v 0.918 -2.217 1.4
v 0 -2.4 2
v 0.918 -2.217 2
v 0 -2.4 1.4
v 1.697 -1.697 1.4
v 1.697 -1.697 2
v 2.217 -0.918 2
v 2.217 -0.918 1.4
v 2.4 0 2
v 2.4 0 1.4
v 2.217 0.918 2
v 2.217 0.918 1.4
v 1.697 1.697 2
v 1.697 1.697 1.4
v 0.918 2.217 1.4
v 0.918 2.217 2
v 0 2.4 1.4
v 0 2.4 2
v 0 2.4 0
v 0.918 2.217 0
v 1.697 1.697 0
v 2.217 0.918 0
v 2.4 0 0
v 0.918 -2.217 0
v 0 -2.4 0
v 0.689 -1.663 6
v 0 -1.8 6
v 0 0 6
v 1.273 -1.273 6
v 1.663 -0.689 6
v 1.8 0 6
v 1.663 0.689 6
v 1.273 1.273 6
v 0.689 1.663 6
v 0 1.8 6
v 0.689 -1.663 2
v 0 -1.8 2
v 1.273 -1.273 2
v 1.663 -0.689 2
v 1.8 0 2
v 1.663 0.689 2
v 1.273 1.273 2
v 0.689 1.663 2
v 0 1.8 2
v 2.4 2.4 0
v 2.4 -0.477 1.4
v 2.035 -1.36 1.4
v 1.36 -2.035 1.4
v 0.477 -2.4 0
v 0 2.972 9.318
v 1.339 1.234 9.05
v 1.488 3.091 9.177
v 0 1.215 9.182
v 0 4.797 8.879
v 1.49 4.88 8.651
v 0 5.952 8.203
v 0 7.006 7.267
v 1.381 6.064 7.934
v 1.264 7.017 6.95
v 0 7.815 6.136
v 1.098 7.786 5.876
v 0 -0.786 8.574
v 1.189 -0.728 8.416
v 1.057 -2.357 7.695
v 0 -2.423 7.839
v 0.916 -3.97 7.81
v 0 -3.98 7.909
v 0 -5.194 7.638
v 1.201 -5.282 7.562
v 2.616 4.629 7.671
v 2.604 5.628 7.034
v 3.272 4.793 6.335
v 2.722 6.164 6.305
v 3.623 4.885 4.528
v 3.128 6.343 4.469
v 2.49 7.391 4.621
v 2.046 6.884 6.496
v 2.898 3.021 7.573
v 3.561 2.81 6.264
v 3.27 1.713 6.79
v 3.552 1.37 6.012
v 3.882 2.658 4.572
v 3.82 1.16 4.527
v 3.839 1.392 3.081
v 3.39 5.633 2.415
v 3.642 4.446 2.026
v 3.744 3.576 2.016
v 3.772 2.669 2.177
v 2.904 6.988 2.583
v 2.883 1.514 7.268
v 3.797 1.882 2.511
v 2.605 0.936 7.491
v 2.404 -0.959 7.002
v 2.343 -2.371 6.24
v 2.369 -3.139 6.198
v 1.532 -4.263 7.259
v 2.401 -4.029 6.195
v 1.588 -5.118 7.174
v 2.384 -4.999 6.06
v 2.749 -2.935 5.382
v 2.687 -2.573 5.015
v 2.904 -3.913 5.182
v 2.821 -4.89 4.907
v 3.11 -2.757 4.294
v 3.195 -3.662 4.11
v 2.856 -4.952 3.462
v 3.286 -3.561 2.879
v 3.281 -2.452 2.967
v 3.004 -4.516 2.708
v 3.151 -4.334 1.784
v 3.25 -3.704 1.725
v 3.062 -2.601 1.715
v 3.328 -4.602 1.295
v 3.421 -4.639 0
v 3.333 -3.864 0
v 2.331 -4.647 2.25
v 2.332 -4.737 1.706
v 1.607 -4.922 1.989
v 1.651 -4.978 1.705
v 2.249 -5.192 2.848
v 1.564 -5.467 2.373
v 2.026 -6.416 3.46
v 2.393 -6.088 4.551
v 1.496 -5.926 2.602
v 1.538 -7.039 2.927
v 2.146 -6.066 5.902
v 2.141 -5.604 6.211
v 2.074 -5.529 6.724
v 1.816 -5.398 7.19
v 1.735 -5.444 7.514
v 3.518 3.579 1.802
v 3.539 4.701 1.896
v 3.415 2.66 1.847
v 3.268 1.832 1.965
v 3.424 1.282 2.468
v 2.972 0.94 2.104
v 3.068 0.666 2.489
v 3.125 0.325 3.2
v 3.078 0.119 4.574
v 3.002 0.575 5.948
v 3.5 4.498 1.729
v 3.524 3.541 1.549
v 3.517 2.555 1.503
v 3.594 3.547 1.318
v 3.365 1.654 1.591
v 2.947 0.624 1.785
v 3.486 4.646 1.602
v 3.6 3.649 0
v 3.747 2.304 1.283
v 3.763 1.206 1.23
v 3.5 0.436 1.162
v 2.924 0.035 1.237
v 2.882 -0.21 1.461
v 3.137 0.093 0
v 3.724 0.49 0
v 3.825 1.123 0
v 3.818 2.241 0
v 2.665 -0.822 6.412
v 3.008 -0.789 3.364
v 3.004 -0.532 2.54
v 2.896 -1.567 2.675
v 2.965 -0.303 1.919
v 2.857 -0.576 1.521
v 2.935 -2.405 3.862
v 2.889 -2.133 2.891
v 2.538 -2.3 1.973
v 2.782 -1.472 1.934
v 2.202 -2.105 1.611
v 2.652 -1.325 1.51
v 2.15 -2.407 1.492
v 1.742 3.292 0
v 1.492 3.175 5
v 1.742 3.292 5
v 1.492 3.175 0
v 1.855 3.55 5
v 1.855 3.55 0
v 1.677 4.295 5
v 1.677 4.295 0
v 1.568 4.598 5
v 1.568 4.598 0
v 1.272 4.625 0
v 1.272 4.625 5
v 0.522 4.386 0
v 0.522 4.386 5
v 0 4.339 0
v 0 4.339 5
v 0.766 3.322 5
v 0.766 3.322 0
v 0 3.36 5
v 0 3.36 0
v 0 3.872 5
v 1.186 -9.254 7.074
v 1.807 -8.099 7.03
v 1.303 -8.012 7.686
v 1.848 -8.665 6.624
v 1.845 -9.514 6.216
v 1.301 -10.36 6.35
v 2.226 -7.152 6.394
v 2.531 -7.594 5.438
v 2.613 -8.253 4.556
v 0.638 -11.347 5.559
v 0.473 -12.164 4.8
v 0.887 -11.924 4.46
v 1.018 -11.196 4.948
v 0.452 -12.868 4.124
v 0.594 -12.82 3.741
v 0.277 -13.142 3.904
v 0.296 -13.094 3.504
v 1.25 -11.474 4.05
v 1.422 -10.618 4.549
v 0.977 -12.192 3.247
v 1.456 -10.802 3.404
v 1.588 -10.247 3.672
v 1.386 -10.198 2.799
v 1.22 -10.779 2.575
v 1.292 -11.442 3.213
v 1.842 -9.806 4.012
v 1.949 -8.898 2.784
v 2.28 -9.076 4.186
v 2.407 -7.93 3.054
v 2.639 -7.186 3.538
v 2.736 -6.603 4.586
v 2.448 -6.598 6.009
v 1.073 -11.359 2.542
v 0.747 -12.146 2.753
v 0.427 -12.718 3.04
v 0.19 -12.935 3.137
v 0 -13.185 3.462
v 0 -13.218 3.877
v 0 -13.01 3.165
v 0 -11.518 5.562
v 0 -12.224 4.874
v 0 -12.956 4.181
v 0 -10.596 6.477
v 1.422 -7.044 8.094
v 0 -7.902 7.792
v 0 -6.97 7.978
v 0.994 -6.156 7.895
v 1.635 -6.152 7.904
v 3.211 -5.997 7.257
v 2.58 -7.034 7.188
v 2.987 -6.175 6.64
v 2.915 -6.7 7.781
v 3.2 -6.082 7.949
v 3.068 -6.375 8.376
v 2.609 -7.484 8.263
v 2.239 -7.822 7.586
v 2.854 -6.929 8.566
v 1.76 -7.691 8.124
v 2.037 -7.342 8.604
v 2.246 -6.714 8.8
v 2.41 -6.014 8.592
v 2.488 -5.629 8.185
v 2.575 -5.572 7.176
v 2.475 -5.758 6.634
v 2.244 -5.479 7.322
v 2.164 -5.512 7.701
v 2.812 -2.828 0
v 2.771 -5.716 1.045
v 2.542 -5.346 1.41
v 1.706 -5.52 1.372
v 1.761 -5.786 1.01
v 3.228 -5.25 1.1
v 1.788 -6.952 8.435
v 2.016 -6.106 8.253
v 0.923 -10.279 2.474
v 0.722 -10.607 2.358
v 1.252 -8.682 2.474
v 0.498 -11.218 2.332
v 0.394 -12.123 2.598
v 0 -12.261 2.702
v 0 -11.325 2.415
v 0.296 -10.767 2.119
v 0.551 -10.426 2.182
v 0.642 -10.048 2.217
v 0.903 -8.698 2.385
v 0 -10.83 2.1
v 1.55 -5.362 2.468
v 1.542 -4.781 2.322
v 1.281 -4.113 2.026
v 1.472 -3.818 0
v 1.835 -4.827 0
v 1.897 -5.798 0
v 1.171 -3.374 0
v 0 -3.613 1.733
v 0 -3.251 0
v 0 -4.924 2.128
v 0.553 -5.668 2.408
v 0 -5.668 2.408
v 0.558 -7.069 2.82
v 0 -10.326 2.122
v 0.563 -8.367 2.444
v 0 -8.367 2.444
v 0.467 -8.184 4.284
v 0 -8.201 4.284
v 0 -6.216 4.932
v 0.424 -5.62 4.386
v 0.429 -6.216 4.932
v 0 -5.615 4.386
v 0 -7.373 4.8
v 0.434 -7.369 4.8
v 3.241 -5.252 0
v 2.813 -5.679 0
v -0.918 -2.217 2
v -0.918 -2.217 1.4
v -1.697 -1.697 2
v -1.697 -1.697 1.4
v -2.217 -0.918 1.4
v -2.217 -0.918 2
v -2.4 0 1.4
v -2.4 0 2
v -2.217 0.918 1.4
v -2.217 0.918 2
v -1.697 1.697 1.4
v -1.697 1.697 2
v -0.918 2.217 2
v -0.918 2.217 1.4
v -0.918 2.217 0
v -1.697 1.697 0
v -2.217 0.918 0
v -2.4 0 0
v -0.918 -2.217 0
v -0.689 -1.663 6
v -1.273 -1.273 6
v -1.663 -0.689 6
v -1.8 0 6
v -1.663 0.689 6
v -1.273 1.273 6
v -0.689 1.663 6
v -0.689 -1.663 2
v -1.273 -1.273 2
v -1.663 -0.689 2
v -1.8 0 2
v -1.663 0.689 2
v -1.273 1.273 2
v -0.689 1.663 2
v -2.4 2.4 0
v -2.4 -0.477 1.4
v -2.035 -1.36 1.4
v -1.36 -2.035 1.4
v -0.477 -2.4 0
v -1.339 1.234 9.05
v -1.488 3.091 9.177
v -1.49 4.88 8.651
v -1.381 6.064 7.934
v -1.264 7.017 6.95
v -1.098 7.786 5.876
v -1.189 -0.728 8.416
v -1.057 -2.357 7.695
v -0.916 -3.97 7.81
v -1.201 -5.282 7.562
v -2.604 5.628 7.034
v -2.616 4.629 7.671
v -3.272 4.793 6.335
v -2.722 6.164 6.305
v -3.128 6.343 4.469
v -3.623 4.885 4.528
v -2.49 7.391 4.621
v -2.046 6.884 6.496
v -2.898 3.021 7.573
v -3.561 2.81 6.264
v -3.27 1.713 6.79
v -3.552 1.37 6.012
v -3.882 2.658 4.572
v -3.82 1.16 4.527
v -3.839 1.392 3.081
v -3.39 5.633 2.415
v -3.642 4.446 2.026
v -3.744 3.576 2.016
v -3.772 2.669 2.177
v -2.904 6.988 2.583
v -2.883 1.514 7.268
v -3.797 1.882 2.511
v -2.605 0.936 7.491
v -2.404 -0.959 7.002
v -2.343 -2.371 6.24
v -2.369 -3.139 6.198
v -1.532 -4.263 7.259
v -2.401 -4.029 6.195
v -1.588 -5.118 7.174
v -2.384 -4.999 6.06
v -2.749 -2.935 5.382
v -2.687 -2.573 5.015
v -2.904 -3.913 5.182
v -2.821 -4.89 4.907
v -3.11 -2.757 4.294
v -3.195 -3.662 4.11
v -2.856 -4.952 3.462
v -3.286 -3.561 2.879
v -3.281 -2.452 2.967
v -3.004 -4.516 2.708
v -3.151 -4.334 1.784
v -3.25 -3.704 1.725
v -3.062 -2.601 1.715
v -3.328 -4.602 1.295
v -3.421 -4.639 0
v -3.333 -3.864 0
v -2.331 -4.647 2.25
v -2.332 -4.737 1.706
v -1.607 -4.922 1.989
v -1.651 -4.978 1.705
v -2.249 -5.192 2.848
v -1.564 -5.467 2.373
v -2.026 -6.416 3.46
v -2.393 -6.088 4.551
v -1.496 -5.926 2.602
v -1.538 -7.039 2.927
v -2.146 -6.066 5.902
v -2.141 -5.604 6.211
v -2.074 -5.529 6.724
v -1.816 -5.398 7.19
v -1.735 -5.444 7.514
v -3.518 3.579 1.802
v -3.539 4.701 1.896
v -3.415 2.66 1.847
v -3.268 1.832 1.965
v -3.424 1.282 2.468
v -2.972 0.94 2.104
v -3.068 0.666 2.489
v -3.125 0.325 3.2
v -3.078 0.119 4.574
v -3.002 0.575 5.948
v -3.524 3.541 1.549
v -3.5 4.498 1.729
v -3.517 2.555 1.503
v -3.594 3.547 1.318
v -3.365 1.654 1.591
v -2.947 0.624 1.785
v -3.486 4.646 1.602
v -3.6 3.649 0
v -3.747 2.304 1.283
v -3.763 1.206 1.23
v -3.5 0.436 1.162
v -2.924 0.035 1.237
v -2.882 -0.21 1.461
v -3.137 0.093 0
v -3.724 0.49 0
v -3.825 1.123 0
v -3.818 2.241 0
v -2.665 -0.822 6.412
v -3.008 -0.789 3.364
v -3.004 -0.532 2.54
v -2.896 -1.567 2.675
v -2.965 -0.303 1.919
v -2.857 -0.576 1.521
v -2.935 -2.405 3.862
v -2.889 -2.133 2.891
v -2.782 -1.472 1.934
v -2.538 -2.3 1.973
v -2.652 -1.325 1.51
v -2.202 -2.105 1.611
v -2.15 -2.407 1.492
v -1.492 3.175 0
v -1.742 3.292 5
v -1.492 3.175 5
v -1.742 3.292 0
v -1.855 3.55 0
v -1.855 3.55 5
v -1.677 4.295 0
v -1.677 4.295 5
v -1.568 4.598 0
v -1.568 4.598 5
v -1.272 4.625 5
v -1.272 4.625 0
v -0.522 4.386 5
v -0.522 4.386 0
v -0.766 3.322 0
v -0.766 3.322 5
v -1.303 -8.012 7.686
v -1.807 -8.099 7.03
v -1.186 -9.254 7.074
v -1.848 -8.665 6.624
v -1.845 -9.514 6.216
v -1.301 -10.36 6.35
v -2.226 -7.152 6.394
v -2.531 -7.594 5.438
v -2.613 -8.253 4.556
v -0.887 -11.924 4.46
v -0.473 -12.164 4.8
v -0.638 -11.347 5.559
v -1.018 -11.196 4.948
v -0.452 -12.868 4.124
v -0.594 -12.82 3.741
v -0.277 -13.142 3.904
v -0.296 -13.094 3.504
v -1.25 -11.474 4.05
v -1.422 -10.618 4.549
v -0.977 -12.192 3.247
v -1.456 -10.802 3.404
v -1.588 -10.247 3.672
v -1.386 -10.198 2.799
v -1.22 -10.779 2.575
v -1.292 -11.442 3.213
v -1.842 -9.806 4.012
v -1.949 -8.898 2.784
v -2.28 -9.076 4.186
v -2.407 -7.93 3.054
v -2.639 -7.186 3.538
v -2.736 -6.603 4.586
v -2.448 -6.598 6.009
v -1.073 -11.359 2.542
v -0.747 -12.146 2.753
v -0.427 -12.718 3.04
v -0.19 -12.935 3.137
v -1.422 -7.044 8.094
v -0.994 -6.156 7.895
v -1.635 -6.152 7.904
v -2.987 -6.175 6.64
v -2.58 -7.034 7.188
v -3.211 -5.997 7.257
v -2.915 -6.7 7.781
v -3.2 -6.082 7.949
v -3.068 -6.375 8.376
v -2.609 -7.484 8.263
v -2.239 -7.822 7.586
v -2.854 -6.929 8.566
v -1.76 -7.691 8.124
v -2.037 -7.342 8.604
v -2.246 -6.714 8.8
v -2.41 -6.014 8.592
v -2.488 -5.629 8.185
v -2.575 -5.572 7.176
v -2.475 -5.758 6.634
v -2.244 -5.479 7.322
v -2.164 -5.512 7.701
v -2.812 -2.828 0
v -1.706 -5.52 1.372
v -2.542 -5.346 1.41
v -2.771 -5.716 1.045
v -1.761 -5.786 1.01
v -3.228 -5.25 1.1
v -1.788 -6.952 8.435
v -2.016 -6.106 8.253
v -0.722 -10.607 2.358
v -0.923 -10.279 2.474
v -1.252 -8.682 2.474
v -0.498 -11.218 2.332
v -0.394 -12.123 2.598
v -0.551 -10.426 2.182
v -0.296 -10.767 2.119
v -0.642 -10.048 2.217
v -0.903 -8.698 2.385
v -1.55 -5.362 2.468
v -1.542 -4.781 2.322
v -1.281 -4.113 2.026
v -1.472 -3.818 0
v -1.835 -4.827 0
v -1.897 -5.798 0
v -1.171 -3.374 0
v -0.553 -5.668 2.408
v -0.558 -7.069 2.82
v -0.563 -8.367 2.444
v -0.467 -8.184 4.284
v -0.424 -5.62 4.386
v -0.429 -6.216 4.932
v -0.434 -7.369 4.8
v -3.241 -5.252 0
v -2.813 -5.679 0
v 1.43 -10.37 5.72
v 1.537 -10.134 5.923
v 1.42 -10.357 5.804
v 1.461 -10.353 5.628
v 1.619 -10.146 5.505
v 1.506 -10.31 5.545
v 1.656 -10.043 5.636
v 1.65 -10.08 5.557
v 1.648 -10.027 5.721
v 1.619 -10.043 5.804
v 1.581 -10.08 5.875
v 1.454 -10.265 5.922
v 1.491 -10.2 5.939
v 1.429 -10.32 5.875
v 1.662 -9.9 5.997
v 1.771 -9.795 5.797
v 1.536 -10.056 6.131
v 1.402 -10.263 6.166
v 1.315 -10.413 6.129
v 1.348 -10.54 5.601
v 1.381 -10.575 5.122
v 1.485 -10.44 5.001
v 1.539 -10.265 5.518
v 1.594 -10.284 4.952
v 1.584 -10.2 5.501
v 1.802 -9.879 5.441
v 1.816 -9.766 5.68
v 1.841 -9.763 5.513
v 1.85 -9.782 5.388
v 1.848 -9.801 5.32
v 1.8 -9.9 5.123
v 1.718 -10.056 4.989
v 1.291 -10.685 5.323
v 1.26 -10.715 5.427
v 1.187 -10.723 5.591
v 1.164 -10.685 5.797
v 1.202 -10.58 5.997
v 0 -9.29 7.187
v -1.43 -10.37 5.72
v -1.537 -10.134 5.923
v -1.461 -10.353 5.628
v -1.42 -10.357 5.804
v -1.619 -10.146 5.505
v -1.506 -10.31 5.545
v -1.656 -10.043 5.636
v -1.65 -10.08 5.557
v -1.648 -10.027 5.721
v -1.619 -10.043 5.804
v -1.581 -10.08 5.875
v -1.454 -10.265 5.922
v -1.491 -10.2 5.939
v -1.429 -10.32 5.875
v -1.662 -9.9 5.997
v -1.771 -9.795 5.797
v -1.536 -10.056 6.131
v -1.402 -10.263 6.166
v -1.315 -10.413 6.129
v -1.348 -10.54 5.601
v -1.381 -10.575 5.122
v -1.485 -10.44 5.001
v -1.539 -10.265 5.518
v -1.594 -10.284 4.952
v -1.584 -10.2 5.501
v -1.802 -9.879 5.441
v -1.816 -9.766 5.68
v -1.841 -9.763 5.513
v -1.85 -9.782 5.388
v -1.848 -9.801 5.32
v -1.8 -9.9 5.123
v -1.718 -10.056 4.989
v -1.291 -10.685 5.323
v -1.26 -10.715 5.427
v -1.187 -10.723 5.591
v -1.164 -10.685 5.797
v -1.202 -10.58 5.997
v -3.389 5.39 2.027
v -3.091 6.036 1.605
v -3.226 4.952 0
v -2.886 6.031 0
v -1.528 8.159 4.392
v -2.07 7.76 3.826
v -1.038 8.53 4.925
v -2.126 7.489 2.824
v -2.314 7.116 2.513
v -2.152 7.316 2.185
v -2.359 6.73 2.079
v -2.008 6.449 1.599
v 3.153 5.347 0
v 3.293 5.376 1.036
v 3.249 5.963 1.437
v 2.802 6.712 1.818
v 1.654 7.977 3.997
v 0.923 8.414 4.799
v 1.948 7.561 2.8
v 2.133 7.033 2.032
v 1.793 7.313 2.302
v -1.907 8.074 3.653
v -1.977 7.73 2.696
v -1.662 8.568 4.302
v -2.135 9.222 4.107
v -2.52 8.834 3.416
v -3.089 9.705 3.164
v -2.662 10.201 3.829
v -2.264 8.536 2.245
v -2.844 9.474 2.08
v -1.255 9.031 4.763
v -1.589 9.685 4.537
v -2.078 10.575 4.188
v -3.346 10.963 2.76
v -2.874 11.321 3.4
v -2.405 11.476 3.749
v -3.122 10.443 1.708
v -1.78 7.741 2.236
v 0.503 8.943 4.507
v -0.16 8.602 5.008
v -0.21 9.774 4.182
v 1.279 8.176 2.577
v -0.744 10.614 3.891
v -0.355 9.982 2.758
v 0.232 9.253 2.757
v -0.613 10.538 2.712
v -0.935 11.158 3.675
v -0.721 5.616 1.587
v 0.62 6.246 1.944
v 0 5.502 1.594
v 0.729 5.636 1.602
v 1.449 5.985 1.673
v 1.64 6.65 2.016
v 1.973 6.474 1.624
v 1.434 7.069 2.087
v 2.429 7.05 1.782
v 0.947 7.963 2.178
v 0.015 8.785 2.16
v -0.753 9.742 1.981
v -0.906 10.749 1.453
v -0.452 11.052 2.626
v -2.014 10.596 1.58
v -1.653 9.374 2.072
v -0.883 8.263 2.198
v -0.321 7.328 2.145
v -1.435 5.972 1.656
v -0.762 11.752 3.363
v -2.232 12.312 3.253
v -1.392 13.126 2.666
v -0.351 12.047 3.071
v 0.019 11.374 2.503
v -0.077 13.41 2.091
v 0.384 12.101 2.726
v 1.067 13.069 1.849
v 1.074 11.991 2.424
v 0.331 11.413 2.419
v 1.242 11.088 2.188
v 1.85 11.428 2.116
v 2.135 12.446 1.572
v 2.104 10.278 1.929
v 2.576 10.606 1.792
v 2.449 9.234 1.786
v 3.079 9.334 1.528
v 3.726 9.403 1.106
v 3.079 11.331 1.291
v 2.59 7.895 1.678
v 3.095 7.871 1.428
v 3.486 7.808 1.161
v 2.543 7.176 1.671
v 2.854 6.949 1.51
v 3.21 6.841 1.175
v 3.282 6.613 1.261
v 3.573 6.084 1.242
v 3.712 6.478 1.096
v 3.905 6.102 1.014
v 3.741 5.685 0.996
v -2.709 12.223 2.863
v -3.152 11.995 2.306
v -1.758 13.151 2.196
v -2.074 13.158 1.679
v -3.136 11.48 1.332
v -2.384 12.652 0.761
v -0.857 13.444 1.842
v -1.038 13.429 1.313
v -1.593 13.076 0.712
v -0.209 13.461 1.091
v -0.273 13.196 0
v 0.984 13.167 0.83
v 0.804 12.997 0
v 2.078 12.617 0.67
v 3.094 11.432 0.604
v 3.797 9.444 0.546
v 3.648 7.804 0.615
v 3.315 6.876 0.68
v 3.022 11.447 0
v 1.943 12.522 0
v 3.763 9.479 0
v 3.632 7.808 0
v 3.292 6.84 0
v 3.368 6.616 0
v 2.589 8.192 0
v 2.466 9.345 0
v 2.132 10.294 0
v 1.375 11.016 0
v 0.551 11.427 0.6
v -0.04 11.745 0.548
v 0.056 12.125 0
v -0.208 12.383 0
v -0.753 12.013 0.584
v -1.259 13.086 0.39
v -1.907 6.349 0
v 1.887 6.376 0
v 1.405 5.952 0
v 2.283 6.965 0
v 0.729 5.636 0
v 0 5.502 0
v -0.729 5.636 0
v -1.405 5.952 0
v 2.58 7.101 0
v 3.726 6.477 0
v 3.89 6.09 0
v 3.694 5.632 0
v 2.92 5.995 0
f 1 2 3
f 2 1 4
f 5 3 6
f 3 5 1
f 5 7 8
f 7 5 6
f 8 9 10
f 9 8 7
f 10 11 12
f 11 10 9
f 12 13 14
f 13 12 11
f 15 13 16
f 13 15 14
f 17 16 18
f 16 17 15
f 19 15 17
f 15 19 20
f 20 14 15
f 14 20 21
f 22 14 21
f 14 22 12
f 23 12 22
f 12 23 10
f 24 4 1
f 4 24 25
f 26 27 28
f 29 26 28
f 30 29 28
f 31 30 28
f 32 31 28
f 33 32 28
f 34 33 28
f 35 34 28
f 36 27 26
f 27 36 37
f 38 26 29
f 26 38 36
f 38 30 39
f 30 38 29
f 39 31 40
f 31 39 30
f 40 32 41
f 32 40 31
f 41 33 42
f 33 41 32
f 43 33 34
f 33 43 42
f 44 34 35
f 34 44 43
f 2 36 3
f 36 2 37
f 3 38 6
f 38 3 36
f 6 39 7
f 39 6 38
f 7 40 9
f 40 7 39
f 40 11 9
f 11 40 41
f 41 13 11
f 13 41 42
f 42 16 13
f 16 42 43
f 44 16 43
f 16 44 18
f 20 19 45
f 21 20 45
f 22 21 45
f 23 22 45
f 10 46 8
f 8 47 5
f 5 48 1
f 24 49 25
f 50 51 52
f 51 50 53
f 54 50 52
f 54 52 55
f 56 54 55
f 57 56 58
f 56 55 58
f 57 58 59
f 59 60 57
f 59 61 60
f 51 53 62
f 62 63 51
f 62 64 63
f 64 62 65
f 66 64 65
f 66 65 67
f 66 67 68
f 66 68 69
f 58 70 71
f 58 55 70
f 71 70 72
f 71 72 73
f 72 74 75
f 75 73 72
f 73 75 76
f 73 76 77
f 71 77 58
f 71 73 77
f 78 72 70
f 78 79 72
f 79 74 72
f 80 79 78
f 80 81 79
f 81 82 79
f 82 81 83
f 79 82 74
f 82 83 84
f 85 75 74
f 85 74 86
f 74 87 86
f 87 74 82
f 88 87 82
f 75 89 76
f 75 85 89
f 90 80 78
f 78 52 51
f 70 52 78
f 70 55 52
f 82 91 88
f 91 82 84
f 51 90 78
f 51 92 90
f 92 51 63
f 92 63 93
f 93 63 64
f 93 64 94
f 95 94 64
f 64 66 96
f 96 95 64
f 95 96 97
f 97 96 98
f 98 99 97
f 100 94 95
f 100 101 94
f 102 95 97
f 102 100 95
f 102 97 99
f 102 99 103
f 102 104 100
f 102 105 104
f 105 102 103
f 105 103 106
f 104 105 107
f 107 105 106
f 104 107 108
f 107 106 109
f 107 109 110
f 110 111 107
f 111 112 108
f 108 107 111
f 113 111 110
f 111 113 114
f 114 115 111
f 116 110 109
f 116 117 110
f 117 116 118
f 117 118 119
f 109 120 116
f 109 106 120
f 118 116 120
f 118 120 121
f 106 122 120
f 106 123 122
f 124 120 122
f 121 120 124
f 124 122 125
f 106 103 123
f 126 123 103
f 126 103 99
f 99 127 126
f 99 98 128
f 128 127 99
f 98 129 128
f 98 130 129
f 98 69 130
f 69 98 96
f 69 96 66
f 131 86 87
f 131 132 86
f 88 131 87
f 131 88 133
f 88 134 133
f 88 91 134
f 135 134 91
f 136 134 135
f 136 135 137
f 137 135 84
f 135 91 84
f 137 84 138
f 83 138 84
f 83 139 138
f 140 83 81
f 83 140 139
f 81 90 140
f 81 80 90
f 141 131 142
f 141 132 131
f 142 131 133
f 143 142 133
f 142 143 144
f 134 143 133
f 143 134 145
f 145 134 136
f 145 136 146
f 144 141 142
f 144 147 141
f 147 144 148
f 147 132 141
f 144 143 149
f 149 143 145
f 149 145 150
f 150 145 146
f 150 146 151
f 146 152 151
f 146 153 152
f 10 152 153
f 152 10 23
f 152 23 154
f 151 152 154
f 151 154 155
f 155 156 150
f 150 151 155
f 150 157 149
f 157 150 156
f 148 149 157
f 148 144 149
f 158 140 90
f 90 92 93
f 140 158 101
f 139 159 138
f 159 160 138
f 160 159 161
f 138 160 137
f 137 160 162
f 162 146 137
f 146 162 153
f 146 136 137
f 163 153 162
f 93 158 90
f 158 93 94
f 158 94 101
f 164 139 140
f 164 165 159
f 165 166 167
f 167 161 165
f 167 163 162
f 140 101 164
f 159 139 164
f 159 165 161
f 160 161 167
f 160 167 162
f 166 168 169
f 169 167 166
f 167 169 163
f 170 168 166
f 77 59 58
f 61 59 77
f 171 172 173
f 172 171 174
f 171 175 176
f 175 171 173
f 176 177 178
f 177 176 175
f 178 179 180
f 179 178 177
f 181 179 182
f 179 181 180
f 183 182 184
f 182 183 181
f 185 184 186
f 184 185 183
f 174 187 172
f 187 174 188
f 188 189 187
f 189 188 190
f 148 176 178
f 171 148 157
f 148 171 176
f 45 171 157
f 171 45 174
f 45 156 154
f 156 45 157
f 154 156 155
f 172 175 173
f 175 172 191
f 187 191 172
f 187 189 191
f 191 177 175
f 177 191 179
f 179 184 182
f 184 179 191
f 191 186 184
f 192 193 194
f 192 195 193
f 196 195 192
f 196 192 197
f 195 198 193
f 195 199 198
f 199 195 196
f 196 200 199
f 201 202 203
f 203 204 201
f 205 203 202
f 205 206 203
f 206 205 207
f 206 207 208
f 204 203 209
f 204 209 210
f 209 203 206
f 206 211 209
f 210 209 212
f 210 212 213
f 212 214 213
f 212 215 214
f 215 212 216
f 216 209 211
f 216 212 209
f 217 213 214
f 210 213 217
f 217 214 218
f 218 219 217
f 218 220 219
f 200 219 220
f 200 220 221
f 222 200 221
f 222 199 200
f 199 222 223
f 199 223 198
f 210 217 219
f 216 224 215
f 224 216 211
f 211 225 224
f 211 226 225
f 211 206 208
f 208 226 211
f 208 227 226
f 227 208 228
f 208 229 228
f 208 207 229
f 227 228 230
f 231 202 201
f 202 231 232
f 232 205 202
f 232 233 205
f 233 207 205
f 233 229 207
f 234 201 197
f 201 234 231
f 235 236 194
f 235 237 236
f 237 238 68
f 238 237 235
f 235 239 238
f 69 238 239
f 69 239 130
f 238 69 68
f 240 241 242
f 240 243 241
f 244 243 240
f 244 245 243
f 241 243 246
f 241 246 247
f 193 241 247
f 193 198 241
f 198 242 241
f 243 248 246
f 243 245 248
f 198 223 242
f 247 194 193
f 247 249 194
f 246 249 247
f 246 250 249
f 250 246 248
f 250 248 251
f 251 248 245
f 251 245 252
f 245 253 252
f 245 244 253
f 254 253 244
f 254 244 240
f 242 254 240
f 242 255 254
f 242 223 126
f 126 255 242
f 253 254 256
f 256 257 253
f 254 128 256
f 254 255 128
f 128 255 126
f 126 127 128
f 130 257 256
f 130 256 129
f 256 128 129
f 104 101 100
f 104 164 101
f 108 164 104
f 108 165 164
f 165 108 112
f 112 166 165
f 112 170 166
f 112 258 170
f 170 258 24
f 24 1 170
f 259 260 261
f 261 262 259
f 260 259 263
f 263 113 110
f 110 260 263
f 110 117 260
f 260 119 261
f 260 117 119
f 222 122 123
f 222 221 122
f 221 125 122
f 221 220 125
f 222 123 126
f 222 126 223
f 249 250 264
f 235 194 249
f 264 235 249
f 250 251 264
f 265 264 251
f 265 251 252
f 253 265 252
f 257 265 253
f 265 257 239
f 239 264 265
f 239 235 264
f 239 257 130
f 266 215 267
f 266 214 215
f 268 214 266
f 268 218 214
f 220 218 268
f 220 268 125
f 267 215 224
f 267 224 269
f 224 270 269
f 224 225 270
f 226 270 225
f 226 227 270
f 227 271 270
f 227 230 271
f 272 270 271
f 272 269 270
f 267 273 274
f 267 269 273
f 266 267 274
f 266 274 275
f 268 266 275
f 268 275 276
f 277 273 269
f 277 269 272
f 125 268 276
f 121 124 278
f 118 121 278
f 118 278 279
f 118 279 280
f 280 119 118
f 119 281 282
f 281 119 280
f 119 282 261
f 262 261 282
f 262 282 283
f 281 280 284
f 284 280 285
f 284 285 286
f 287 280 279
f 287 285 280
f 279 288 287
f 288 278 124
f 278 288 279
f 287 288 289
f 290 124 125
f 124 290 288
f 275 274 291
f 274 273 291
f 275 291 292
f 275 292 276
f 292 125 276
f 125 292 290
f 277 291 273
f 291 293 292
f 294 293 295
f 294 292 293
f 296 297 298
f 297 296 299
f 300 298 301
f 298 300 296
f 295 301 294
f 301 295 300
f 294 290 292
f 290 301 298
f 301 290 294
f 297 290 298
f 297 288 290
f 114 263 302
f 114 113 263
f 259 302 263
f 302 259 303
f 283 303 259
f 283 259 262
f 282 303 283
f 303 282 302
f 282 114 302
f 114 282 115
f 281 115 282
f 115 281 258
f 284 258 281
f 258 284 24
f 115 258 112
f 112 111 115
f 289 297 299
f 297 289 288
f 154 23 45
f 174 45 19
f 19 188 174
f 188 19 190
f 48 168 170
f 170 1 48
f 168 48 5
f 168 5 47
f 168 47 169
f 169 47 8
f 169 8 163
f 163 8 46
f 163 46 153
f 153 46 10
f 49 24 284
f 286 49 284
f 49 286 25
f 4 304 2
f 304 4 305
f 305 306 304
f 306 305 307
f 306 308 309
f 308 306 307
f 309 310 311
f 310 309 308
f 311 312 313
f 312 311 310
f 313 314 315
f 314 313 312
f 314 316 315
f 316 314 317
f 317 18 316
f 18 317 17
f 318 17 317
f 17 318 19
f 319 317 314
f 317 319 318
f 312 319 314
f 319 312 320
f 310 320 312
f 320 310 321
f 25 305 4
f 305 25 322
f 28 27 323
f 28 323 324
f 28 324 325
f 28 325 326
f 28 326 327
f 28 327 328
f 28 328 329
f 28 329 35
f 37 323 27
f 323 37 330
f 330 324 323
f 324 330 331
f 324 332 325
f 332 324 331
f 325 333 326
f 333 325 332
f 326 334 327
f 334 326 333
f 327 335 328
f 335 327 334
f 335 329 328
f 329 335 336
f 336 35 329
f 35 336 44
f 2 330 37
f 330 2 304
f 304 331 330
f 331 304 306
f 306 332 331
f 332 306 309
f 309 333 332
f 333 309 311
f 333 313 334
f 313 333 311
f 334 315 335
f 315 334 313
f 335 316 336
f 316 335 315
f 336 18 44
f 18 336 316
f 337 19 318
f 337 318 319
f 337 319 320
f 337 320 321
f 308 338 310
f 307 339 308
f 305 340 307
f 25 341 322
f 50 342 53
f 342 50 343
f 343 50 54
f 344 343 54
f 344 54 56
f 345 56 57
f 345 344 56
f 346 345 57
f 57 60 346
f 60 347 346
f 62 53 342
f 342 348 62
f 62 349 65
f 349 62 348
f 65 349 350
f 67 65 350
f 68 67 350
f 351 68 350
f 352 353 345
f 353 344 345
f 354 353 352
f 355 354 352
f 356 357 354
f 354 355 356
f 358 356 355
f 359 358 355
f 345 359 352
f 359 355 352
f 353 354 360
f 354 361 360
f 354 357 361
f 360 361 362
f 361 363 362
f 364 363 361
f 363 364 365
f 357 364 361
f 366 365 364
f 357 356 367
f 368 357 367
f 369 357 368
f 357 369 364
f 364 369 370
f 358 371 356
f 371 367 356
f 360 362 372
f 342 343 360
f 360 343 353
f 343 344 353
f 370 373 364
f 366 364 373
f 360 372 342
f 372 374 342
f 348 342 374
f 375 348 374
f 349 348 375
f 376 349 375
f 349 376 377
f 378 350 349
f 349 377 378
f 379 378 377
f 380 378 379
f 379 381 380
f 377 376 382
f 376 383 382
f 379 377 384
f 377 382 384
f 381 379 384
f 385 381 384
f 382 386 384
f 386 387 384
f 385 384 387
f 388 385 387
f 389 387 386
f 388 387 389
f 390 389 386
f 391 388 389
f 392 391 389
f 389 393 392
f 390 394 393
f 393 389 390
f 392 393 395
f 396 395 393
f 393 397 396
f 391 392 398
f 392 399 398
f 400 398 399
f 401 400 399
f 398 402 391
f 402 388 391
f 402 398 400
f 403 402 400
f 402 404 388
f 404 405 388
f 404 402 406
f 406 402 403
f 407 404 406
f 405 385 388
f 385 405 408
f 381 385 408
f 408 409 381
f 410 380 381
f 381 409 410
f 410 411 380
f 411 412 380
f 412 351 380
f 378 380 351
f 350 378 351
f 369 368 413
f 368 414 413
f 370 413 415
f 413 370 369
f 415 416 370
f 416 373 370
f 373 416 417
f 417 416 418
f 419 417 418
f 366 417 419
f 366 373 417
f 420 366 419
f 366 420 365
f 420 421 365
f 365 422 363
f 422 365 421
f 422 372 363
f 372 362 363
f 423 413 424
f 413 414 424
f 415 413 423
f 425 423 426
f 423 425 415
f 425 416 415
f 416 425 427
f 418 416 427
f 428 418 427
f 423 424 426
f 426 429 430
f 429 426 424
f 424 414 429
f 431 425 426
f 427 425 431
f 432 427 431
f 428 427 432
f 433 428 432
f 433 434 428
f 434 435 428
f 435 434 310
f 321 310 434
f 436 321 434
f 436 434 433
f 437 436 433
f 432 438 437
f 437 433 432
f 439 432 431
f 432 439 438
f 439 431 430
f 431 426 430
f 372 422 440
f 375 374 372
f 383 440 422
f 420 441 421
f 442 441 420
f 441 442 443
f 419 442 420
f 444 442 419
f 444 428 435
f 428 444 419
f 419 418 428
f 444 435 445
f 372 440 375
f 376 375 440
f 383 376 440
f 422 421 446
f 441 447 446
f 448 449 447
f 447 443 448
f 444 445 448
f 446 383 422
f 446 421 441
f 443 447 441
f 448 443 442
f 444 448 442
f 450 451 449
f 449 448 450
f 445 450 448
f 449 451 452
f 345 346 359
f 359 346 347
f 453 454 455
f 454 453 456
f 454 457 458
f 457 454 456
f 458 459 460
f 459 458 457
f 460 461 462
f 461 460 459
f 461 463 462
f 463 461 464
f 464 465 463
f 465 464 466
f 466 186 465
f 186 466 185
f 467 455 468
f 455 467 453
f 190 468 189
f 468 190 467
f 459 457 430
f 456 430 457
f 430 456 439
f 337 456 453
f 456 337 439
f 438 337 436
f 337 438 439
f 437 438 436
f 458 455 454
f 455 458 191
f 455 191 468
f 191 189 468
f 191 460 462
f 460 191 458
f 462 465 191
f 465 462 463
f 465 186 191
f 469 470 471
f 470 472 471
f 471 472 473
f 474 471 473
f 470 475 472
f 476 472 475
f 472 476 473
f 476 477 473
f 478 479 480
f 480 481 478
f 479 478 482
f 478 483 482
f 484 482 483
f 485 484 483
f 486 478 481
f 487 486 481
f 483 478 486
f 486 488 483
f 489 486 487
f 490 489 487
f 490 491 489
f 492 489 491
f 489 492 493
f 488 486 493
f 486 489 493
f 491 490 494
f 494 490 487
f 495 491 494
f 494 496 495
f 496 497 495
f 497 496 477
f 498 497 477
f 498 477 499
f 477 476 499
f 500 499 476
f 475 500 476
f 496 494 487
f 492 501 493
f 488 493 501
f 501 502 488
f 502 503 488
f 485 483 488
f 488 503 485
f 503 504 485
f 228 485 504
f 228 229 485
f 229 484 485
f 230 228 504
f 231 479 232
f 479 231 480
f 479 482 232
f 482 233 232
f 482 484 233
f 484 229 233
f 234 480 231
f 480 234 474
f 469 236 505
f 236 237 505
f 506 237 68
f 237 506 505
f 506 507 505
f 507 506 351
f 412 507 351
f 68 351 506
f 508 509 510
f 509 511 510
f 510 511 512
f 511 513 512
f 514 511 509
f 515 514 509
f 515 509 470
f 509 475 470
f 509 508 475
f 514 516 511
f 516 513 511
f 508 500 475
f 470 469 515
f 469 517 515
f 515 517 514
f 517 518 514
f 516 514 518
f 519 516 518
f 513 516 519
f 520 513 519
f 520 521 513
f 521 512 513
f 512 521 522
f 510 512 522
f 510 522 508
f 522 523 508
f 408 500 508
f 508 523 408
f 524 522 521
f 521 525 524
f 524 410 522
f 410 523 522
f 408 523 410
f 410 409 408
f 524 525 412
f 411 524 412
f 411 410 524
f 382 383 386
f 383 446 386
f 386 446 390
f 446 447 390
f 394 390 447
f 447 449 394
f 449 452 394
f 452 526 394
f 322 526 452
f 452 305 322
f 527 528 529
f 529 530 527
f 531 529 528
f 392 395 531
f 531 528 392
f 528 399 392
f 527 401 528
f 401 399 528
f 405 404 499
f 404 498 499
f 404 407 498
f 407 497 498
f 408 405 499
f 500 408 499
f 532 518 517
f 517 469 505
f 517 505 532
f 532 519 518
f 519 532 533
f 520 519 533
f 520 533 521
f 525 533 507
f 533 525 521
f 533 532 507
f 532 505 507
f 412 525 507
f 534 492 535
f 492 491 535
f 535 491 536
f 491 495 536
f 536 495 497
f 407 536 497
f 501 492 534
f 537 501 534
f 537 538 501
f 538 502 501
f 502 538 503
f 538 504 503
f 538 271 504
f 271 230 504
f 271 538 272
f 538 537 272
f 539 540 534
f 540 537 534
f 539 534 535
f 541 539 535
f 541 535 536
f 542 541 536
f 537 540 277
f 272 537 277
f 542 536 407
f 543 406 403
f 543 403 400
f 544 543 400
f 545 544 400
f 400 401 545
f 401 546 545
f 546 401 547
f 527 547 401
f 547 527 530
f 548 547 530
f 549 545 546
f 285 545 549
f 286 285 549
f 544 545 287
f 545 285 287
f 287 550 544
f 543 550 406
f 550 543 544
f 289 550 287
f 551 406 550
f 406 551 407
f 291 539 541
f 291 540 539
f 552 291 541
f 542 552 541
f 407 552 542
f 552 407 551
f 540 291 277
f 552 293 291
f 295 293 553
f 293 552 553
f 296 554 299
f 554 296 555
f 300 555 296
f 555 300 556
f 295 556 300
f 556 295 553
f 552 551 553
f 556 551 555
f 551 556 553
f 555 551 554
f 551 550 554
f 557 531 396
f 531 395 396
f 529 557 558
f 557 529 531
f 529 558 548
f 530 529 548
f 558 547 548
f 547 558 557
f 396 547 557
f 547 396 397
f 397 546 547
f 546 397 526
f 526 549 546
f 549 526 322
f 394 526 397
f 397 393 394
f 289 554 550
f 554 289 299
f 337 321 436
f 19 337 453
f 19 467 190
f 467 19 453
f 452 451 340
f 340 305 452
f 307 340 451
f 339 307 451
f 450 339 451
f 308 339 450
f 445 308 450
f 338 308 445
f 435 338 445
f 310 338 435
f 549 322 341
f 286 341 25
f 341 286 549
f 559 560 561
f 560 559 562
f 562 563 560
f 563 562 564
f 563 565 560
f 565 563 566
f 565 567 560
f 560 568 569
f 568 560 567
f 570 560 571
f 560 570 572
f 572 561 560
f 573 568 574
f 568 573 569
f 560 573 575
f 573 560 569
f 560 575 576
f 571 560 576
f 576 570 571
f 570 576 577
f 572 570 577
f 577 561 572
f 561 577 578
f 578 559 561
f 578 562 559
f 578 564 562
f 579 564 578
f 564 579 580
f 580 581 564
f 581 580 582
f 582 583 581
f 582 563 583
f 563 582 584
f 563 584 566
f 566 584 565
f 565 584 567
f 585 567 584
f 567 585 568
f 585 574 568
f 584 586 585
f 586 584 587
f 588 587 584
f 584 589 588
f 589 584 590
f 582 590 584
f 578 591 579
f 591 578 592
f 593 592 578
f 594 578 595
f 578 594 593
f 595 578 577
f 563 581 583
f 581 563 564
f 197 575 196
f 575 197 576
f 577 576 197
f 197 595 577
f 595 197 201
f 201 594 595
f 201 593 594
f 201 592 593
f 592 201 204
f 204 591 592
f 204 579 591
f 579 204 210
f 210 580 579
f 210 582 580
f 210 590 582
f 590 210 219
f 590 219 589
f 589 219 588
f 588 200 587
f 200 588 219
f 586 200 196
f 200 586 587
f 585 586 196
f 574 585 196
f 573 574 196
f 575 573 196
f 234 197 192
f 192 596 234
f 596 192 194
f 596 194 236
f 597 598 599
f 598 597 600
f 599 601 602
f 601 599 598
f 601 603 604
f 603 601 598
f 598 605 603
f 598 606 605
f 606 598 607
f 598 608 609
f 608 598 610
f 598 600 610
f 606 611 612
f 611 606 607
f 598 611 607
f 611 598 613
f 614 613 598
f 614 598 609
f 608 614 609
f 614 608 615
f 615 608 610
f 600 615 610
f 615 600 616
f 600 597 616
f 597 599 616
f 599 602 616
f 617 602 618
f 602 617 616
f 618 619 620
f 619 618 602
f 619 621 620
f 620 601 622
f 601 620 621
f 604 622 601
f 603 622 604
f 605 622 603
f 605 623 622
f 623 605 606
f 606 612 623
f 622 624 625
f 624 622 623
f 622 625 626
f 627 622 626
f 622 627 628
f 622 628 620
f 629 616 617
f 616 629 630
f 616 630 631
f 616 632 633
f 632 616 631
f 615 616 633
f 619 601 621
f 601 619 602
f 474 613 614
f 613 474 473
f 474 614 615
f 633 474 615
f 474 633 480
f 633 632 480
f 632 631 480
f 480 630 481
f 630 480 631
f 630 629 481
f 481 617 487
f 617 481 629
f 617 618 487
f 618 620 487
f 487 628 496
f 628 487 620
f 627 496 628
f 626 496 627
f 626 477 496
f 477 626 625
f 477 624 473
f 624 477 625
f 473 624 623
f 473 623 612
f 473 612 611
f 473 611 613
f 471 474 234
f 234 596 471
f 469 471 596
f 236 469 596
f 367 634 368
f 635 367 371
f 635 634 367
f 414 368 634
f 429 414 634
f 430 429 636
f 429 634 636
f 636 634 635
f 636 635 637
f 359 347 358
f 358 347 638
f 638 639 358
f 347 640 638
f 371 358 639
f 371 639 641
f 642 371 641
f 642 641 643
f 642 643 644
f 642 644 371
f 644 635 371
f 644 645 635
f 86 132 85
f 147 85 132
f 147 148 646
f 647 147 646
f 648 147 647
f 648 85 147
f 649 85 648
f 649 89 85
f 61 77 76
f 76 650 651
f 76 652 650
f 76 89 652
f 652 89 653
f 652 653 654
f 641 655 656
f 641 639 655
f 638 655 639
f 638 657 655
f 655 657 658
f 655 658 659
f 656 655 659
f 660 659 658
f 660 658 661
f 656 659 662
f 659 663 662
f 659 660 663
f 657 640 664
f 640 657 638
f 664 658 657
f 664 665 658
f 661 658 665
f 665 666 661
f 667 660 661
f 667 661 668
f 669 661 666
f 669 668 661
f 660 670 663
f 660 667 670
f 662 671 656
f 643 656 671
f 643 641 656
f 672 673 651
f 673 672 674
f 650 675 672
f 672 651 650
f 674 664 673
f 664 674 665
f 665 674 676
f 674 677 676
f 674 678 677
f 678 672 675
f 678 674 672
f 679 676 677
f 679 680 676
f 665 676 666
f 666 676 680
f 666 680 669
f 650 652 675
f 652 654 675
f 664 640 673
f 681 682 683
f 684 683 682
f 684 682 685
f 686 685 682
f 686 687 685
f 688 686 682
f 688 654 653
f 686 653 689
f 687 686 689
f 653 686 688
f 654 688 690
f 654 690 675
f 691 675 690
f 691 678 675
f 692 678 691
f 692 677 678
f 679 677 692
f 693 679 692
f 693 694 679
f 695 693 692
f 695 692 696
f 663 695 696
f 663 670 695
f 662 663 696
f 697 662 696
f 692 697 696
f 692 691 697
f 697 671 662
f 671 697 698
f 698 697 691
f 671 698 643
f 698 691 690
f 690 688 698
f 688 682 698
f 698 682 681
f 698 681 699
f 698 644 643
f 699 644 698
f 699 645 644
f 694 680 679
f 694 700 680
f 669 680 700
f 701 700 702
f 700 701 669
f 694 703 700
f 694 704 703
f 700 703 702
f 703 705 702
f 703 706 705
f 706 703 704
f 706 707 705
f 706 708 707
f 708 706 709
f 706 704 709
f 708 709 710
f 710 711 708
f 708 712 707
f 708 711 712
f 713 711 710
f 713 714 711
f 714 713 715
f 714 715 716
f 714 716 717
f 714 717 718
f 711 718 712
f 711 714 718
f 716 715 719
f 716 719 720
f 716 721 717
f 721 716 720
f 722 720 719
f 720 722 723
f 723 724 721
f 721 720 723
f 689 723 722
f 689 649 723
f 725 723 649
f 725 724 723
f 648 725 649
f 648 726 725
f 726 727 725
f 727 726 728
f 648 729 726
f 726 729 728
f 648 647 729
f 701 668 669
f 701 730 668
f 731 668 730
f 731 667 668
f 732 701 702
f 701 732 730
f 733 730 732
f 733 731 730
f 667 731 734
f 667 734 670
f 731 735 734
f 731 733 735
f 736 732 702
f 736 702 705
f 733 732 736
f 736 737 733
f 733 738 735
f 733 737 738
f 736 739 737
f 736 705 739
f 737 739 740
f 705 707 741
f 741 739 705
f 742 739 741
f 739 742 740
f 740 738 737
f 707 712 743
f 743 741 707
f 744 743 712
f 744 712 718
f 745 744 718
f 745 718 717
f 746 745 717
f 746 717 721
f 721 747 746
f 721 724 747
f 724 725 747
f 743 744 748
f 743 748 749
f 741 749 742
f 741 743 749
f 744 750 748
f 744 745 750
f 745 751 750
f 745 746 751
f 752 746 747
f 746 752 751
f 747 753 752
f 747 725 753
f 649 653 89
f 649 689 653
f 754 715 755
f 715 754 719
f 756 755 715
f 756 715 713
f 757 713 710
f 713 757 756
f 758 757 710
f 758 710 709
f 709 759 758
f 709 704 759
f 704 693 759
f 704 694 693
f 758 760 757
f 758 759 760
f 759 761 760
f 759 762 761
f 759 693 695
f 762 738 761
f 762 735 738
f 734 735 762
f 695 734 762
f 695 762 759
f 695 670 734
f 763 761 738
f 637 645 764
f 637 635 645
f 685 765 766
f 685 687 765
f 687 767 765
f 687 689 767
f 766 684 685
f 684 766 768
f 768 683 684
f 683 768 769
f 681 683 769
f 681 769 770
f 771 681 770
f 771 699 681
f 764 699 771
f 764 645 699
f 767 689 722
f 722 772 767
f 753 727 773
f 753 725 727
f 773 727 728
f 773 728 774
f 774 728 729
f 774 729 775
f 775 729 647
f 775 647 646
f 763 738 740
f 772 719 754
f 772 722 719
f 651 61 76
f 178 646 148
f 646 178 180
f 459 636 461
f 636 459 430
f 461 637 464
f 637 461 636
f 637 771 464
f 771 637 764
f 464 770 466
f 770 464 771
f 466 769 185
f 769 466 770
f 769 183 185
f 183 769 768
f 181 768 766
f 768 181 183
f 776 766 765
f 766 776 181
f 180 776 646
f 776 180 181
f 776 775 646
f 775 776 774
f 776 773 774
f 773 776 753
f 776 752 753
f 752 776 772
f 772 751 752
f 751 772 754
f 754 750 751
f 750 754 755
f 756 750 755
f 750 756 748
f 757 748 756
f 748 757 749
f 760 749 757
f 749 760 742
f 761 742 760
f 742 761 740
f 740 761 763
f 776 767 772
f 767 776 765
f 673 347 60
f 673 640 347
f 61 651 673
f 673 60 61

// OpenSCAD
use <../lib.scad>
use <s/36756p01s04.scad>
use <s/36756s01.scad>
use <s/36756s02.scad>
use <s/36756s03.scad>
function ldraw_lib__36756p01() = [
// 0 Animal Rat with Bent Tail with Black Eye Pattern
// 0 Name: 36756p01.dat
// 0 Author: Philippe Hurbain [Philo]
// 0 !LDRAW_ORG Part UPDATE 2024-08
// 0 !LICENSE Licensed under CC BY 4.0 : see CAreadme.txt
// 
// 0 BFC CERTIFY CCW
  [0,"BFC","CERTIFY"],
  [0,"BFC","CCW"],
// 
// 0 !KEYWORDS Bricklink 36756pb01, Rebrickable 36756pr0001, Rodent, Set 60192
// 0 !KEYWORDS set 75954, Set 76178
// 
// 0 !HISTORY 2022-01-13 {LEGO Instructions App} Original part shape
// 0 !HISTORY 2022-01-13 [Philo] File preparation for LDraw Parts Tracker
// 0 !HISTORY 2024-09-30 [OrionP] Official Update 2024-08
// 
// 
// 1 16 0 0 0 1 0 0 0 1 0 0 0 1 s\36756s01.dat
  [1,16,0,0,0,1,0,0,0,1,0,0,0,1, ldraw_lib__s__36756s01()],
// 1 16 0 0 0 -1 0 0 0 1 0 0 0 1 s\36756s01.dat
  [1,16,0,0,0,-1,0,0,0,1,0,0,0,1, ldraw_lib__s__36756s01()],
// 1 16 0 0 0 1 0 0 0 1 0 0 0 1 s\36756p01s04.dat
  [1,16,0,0,0,1,0,0,0,1,0,0,0,1, ldraw_lib__s__36756p01s04()],
// 1 16 0 0 0 1 0 0 0 1 0 0 0 1 s\36756s03.dat
  [1,16,0,0,0,1,0,0,0,1,0,0,0,1, ldraw_lib__s__36756s03()],
// 1 16 0 0 0 -1 0 0 0 1 0 0 0 1 s\36756p01s04.dat
  [1,16,0,0,0,-1,0,0,0,1,0,0,0,1, ldraw_lib__s__36756p01s04()],
// 1 16 0 0 0 -1 0 0 0 1 0 0 0 1 s\36756s03.dat
  [1,16,0,0,0,-1,0,0,0,1,0,0,0,1, ldraw_lib__s__36756s03()],
// 1 16 0 0 0 1 0 0 0 1 0 0 0 1 s\36756s02.dat
  [1,16,0,0,0,1,0,0,0,1,0,0,0,1, ldraw_lib__s__36756s02()],
];
module ldraw_lib__36756p01(step=0, col=false, unit=2/5, alt=false, line=0.2, solid=!$preview)
    makepoly(ldraw_lib__36756p01(), step=step, col=col, unit=unit, alt=alt, line=line, solid=solid);
ldraw_lib__36756p01(line=0.2);
